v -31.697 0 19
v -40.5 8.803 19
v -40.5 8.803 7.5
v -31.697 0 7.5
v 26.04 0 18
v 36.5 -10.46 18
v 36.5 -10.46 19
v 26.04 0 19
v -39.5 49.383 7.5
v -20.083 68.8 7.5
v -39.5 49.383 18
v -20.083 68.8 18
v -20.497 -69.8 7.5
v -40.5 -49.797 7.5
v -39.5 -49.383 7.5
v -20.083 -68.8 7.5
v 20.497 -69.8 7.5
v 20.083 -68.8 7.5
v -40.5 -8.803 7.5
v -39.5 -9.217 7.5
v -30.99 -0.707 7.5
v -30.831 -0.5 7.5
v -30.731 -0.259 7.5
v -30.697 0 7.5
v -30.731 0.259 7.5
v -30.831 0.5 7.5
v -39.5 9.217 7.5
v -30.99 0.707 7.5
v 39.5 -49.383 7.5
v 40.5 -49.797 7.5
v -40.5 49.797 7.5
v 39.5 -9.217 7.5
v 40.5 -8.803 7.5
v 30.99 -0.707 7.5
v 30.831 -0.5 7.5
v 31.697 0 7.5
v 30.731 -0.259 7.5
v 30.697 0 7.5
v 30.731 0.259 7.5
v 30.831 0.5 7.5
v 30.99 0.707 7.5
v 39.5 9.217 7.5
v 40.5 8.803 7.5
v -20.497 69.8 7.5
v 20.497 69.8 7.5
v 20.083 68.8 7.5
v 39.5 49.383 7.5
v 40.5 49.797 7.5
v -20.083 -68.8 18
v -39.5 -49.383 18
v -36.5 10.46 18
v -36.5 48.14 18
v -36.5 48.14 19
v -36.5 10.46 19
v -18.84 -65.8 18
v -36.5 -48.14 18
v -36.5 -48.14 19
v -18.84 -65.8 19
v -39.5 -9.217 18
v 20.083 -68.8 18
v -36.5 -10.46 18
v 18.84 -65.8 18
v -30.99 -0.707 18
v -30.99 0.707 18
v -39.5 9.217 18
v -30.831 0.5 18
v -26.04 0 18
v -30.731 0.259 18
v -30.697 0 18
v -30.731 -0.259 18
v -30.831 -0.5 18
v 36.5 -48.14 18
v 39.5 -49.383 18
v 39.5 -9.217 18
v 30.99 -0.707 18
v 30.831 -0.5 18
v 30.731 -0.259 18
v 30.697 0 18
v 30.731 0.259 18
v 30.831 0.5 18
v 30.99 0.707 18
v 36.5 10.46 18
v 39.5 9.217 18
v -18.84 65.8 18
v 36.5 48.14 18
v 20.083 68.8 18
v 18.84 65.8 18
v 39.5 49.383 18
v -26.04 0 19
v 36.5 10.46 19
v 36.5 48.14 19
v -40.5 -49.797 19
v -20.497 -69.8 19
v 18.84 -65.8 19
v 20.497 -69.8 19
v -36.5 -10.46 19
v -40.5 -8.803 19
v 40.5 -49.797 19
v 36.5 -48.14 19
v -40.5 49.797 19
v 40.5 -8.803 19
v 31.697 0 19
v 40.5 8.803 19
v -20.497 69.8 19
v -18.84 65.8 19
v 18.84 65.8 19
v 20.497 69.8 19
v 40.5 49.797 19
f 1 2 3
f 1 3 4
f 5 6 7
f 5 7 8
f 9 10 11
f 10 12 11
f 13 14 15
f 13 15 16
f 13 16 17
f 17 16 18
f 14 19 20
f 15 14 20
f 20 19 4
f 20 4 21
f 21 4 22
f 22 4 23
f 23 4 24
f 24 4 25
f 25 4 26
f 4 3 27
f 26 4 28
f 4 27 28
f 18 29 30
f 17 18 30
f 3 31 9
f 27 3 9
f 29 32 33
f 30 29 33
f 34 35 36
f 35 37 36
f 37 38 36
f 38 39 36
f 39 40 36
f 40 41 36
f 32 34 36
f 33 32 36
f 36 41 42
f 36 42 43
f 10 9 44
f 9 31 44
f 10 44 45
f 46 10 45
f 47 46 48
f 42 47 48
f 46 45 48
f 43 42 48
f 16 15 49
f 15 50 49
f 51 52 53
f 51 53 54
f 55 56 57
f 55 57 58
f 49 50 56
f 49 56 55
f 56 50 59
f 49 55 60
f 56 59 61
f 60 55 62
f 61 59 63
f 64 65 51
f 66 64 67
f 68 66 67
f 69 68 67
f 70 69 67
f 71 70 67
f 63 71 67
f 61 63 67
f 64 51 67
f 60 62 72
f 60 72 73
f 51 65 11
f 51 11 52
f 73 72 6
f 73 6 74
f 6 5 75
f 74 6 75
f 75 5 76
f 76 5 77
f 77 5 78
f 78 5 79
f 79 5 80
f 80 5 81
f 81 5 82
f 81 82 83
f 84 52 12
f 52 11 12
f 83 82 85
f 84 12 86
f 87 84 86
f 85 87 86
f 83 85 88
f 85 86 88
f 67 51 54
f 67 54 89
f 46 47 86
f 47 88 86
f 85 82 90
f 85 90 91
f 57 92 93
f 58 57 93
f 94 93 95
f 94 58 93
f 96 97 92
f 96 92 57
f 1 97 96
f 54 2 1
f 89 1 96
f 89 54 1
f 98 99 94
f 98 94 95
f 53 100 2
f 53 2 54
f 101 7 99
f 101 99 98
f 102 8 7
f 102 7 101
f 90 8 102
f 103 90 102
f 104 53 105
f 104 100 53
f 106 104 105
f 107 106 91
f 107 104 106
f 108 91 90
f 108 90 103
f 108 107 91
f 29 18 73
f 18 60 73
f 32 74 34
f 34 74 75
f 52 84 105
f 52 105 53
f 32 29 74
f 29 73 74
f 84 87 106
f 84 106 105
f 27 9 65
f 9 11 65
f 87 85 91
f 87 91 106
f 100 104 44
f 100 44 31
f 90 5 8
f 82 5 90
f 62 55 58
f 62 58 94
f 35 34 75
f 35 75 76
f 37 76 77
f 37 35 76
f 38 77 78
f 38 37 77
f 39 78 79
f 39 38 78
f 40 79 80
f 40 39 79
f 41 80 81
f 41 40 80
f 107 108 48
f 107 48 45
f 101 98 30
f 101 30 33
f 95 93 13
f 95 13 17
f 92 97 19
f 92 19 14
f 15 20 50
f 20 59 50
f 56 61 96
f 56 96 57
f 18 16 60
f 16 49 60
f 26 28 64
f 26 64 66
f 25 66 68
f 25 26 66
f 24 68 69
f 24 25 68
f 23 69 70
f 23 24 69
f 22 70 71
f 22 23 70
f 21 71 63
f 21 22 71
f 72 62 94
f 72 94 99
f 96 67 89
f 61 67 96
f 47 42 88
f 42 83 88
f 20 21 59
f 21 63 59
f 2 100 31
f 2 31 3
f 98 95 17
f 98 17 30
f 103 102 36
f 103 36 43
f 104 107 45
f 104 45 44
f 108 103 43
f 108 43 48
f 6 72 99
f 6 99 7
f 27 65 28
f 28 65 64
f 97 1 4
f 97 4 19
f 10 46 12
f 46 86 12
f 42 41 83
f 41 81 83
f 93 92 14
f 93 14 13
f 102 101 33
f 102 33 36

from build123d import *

# Parameters (mm, degrees)
PAD006_DEPTH            = 11.5
THICKNESS001_T          = -1
POCKET002_DEPTH         = 5
BODY017_PLACEMENT_ANGLE = 180


with BuildPart() as part:
    # Sketch008 → Pad006 (new body)
    with BuildSketch(Plane.XY):
        Polygon((-20.497056, 69.8), (20.497056, 69.8), (40.5, 49.797056), (40.5, 8.802944), (31.697056, 0), (40.5, -8.802944), (40.5, -49.797056), (20.497056, -69.8), (-20.497056, -69.8), (-40.5, -49.797056), (-40.5, -8.802944), (-31.697056, 0), (-40.5, 8.802944), (-40.5, 49.797056), align=None)
    extrude(amount=PAD006_DEPTH)

    # Thickness001
    thickness001_openings = [part.faces().sort_by_distance(p)[0] for p in [
        (0, 0, 11.5),
    ]]
    offset(amount=THICKNESS001_T, openings=thickness001_openings)

    # Sketch009 (on Face33 of Thickness001) → Pocket002 (cut)
    with BuildSketch(Plane.XY.offset(1)):
        Polygon((-18.840202, 65.8), (18.840202, 65.8), (36.5, 48.140202), (36.5, 10.459798), (26.040202, 0), (36.5, -10.459798), (36.5, -48.140202), (18.840202, -65.8), (-18.840202, -65.8), (-36.5, -48.140202), (-36.5, -10.459798), (-26.040202, 0), (-36.5, 10.459798), (-36.5, 48.140202), align=None)
    extrude(amount=-POCKET002_DEPTH, mode=Mode.SUBTRACT)


with BuildPart() as part_1:
    # Body017 placement: moved
    add(part.part.moved(Location((0, 0, 19))).rotate(Axis((0, 0, 19), (0, 1, 0)), BODY017_PLACEMENT_ANGLE))


solid = part_1.part
